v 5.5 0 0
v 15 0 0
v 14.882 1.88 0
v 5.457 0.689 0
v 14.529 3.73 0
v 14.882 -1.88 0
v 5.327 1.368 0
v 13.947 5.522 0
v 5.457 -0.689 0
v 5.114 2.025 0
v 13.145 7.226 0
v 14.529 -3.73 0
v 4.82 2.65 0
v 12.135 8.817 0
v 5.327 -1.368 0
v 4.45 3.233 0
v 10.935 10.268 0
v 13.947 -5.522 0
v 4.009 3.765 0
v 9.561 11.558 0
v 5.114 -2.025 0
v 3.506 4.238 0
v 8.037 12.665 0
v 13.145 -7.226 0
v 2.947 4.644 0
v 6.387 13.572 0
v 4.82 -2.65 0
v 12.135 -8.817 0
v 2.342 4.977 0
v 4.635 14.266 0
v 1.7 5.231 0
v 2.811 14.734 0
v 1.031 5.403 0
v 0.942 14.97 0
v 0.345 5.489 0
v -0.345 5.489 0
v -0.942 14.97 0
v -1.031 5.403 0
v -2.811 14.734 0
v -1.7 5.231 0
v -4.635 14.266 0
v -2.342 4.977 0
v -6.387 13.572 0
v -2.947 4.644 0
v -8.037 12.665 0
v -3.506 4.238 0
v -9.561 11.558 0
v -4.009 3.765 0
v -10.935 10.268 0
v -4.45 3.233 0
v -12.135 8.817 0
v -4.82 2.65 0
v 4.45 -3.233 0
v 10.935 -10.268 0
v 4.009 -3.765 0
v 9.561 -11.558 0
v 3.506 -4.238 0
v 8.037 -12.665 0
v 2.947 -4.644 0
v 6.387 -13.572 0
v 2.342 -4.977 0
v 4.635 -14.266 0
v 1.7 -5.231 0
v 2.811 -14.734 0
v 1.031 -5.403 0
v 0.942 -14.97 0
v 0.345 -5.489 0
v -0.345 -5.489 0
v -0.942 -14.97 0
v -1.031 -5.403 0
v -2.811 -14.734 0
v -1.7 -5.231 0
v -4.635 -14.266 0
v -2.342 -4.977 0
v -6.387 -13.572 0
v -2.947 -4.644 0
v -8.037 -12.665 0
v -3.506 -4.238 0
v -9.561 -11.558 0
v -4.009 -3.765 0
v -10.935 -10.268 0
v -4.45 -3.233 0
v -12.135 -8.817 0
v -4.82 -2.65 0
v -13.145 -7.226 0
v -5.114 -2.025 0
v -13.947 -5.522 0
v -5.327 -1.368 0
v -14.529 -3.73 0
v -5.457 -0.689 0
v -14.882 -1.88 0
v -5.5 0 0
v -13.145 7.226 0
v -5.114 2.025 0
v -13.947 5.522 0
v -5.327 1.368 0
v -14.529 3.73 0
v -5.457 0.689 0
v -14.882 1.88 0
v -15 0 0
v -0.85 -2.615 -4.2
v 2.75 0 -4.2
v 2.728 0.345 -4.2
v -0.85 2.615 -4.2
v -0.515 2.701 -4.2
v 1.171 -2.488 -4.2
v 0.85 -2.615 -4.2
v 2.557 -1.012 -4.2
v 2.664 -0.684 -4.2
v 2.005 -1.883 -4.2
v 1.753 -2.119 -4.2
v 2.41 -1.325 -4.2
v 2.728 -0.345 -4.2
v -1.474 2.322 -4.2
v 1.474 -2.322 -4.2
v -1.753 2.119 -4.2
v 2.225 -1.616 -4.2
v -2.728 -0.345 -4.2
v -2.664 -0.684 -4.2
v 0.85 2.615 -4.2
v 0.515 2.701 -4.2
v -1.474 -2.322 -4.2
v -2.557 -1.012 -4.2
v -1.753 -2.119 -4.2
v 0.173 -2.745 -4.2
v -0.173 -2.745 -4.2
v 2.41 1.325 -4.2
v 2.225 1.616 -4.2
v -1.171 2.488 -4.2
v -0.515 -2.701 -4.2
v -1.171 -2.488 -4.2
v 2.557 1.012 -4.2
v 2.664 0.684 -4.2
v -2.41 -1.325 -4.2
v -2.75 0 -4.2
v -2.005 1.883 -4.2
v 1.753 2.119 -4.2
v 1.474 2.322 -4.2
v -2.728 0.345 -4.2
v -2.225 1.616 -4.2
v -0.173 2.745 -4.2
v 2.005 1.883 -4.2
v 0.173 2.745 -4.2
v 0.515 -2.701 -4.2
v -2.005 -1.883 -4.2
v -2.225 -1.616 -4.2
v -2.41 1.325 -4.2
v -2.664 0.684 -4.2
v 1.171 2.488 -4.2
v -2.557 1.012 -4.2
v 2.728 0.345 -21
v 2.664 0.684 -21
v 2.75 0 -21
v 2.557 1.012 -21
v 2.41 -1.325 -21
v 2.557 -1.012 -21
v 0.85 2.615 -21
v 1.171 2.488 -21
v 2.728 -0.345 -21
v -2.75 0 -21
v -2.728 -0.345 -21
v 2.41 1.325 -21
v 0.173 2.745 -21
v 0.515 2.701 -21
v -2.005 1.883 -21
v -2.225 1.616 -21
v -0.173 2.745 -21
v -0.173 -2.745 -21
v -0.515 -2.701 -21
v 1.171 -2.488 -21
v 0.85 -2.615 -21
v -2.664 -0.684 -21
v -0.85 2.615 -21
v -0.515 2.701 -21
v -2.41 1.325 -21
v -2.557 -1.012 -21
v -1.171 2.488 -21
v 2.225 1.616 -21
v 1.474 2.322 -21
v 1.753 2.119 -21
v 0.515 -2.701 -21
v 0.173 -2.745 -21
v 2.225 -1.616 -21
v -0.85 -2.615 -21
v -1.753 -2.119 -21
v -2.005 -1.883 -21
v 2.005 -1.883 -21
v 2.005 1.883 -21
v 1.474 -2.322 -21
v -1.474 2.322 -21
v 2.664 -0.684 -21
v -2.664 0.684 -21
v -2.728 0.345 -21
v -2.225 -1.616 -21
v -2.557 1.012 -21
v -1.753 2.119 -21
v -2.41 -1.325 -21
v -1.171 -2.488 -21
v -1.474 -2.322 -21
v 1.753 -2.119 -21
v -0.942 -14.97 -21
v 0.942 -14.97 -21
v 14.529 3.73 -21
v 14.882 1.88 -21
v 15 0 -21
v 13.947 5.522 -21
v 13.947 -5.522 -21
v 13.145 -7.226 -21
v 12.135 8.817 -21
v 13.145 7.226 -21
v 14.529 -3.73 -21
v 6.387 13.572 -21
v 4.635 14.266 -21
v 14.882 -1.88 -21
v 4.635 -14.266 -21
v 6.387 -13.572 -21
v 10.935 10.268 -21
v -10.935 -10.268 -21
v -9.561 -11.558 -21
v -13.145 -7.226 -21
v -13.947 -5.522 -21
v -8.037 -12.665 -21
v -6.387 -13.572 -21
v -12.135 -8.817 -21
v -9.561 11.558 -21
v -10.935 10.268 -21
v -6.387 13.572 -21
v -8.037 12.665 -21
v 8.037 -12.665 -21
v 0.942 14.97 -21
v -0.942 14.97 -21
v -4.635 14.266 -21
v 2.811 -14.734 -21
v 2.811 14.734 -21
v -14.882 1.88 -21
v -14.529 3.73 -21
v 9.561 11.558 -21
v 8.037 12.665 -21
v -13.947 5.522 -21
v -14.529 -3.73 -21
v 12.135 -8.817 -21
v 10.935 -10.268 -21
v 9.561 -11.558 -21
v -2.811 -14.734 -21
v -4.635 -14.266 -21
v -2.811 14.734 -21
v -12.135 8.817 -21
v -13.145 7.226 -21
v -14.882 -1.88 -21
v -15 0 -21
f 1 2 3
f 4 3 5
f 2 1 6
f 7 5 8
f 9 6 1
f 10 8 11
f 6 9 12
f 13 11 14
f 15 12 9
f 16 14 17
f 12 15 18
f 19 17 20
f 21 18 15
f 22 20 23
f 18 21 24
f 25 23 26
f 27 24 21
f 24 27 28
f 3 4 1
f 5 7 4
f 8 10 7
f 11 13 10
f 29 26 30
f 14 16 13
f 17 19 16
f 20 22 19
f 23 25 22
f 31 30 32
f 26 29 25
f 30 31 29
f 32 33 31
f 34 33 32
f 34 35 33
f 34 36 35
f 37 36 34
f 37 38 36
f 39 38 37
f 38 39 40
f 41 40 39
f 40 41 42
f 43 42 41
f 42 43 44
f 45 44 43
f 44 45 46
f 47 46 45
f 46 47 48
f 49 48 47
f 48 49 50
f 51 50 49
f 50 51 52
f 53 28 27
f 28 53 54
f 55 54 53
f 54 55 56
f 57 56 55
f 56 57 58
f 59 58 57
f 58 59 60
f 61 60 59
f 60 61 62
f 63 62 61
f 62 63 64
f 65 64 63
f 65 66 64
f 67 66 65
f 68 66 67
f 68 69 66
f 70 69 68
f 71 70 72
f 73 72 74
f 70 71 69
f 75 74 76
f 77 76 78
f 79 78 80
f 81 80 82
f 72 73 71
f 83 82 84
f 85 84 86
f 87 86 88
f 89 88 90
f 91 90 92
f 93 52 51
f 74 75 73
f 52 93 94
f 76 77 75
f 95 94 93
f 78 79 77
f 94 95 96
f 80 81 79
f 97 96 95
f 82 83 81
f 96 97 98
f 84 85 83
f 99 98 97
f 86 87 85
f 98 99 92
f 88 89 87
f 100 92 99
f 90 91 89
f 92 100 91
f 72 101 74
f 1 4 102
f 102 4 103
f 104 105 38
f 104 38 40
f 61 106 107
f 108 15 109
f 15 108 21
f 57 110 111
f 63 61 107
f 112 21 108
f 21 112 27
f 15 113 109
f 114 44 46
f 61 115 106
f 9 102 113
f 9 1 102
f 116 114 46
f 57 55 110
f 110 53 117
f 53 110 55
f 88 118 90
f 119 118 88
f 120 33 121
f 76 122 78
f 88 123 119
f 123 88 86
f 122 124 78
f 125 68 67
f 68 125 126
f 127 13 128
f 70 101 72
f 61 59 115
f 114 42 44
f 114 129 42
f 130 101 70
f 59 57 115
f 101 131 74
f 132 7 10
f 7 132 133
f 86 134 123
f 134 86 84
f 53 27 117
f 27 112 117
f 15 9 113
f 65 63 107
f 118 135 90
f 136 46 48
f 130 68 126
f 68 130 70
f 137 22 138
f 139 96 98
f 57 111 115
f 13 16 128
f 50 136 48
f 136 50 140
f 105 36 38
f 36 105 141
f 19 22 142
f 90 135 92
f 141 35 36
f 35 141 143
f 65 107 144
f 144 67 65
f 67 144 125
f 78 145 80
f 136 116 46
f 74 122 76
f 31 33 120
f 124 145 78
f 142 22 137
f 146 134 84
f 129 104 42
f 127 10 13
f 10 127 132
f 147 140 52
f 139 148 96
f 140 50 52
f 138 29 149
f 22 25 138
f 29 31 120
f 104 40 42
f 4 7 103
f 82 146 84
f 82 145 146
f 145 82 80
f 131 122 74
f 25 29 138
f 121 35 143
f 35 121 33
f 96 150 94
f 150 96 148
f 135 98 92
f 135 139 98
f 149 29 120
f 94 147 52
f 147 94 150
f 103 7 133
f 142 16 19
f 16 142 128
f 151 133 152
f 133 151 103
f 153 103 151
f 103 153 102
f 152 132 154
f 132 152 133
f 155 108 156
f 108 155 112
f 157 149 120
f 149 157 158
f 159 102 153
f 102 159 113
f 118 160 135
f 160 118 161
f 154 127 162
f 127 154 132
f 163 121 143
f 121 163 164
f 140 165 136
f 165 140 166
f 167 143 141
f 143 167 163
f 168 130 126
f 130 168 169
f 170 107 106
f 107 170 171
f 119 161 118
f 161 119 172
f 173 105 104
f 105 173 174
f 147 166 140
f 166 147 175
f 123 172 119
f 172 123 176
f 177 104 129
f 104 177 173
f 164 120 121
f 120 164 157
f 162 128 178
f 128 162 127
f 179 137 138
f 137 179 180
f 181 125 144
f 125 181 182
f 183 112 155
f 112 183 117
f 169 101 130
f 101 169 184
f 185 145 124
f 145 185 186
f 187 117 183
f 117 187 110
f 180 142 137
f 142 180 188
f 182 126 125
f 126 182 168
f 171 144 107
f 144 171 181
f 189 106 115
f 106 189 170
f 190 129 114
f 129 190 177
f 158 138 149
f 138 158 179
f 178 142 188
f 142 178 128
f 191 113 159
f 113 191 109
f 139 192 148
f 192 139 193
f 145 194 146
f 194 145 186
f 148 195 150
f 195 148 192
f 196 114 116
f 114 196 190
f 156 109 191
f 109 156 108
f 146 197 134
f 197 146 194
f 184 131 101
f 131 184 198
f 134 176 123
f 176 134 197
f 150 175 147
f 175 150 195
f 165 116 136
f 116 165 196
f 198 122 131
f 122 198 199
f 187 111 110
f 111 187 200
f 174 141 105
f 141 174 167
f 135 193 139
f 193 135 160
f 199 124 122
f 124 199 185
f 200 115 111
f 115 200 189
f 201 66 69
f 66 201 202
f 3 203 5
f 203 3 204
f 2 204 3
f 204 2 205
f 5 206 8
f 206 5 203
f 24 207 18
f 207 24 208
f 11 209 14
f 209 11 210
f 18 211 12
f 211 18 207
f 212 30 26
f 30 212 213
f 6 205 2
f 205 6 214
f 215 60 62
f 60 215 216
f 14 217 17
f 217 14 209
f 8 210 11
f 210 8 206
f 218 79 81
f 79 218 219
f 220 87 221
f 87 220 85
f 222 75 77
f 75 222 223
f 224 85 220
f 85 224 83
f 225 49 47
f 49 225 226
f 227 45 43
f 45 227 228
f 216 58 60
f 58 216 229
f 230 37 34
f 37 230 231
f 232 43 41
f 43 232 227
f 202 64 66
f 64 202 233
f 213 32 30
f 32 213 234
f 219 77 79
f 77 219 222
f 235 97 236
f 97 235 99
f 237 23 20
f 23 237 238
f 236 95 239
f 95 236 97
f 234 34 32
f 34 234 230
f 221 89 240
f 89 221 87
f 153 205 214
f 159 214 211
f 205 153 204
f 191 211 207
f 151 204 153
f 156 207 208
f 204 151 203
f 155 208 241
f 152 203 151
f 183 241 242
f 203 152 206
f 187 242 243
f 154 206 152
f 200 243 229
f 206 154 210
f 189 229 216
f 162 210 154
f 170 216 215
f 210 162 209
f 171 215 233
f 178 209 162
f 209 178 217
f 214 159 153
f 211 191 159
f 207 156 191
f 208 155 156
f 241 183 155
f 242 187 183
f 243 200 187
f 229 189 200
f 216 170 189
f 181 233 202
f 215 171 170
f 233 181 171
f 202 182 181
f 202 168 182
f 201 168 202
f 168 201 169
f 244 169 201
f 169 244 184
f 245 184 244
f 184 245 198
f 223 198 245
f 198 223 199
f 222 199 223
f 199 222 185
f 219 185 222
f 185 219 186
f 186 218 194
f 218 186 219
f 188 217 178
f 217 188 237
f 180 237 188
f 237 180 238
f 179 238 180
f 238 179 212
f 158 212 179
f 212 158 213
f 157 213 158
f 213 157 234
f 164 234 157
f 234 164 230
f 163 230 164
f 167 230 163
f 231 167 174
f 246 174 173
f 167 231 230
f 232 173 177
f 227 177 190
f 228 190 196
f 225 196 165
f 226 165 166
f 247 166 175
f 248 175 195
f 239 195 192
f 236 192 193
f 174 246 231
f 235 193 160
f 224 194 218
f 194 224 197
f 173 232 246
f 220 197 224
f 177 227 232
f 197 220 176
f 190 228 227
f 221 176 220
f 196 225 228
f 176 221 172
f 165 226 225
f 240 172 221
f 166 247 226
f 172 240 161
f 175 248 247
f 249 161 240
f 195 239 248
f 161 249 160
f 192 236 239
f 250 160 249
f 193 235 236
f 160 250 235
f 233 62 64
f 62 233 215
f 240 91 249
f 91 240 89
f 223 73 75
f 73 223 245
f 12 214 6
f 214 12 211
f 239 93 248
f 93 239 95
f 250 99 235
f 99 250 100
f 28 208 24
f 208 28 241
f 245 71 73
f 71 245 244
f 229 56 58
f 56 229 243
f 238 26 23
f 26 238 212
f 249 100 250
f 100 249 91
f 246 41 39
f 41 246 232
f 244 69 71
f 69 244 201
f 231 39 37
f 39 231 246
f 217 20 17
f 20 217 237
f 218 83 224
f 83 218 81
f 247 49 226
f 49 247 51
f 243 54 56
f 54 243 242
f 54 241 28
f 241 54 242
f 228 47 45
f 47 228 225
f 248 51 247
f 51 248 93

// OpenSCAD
$fn = 50;

difference() {
	union() {
		translate(v = [0, 0, -21.0]) {
			cylinder(h = 21, r = 15.0);
		}
	}
	union() {
		translate(v = [0, 0, 0]) {
			rotate(a = [0, 0, 0]) {
				difference() {
					union() {
						translate(v = [0, 0, -24.0]) {
							cylinder(h = 24, r = 2.25);
						}
						translate(v = [0, 0, -4.2]) {
							cylinder(h = 4.2, r1 = 2.75, r2 = 5.5);
						}
						translate(v = [0, 0, -24.0]) {
							cylinder(h = 24, r = 2.75);
						}
						translate(v = [0, 0, -24.0]) {
							cylinder(h = 24, r = 2.25);
						}
					}
					union();
				}
			}
		}
	}
}
